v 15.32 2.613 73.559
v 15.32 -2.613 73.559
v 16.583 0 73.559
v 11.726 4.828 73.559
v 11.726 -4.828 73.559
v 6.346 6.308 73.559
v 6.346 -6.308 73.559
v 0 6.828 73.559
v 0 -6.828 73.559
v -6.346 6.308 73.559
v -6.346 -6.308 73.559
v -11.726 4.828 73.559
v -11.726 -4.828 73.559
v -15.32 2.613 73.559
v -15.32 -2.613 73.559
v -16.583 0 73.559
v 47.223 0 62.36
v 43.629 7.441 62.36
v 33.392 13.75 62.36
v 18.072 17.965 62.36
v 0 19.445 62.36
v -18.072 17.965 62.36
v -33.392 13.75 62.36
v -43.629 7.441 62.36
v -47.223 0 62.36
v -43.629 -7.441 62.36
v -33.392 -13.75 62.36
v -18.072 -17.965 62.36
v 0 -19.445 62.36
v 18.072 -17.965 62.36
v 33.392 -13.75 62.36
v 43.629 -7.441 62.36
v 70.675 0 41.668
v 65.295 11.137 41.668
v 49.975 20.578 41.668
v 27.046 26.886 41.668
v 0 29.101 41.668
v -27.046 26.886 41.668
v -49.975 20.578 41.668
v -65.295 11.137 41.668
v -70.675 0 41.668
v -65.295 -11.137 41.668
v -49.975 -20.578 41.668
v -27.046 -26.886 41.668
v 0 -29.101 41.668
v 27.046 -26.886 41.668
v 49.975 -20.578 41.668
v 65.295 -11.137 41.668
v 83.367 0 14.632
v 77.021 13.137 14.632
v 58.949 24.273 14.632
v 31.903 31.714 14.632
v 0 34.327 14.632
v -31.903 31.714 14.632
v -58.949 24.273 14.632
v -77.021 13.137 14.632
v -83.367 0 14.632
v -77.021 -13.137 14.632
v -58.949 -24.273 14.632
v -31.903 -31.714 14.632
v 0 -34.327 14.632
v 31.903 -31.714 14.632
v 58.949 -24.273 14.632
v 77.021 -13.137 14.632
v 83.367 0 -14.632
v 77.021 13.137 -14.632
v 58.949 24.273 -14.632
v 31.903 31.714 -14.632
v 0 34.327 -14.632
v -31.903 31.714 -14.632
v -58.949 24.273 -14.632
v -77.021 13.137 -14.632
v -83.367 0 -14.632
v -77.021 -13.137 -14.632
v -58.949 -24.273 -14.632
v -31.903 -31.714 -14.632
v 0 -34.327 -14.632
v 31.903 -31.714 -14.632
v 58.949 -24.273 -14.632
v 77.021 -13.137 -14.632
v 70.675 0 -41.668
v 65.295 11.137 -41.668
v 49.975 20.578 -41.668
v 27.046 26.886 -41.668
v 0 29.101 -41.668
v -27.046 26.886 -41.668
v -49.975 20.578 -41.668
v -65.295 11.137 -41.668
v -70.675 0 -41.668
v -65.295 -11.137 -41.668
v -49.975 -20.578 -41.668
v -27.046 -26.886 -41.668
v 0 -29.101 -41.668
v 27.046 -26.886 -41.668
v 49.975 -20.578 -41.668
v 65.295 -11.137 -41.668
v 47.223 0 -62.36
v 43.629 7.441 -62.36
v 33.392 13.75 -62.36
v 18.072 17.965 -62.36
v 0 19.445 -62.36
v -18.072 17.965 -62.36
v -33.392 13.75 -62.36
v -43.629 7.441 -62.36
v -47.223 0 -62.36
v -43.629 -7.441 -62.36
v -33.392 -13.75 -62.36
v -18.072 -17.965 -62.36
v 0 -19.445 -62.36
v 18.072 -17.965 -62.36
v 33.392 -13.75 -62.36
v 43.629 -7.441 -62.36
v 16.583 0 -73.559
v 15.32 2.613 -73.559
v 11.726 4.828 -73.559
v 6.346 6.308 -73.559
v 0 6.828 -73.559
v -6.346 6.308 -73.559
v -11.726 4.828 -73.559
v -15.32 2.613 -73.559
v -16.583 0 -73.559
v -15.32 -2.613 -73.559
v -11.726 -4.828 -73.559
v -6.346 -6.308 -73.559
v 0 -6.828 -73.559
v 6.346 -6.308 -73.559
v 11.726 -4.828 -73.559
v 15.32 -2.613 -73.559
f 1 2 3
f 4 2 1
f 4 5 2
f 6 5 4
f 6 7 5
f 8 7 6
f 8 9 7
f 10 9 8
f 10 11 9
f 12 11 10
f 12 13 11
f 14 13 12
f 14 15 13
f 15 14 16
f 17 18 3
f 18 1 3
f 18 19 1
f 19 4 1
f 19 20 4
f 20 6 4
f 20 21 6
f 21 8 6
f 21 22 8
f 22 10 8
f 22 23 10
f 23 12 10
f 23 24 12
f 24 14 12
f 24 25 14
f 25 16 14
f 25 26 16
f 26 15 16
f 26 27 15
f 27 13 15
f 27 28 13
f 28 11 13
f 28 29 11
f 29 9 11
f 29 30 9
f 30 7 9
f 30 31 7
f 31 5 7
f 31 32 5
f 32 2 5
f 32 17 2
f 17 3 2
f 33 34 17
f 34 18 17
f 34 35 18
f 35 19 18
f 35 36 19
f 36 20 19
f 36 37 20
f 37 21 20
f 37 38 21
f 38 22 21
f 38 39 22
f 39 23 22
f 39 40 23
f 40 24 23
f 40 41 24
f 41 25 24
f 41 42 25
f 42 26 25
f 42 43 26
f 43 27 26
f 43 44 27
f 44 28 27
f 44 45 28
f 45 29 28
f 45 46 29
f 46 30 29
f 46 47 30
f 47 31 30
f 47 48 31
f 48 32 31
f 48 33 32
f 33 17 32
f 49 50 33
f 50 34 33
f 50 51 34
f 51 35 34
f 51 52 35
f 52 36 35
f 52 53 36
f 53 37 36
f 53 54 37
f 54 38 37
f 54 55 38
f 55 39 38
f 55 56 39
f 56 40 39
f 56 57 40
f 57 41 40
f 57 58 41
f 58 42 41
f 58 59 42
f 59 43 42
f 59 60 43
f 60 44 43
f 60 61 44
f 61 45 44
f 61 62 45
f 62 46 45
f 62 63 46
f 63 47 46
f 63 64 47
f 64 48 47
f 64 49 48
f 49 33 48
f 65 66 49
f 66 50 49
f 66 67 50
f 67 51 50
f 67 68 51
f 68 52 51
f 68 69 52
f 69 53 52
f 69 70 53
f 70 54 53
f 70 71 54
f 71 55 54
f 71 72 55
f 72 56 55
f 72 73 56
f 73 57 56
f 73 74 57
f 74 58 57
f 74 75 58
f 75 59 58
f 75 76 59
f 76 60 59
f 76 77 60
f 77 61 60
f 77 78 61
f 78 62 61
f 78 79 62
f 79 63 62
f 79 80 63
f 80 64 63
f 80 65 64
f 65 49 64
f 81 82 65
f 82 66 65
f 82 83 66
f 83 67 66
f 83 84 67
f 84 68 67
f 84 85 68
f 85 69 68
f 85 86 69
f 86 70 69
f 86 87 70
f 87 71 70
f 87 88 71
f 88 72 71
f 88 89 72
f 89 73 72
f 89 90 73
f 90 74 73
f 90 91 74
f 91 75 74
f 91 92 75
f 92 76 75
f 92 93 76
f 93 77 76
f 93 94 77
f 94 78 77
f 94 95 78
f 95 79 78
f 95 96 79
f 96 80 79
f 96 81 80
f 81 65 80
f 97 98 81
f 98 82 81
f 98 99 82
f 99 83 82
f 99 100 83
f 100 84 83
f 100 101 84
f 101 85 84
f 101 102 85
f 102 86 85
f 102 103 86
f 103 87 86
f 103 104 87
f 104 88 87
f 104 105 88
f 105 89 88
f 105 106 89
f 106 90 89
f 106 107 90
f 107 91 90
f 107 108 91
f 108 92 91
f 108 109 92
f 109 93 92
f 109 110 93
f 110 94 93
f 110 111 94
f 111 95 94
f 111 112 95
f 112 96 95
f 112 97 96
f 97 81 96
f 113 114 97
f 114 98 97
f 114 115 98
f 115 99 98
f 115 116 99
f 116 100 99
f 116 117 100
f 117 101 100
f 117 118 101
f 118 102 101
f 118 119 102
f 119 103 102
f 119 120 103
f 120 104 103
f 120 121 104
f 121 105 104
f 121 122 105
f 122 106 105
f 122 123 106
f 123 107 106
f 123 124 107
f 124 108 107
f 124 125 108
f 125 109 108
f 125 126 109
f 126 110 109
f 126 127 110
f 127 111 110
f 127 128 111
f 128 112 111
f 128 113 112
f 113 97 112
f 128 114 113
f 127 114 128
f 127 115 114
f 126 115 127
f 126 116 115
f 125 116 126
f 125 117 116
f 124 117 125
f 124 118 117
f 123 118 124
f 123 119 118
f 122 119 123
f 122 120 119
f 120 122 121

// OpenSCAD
// Generated by SolidPython 1.0.1 on 2020-07-29 00:46:52


scale(v = [17, 7, 15]) {
	sphere(r = 5);
}
/***********************************************
*********      SolidPython code:      **********
************************************************
 
# import packages: SolidPython
from solid import *
from solid.utils import *
from itertools import chain, combinations, permutations


class Resize:

    def __init__(self, scad_file):
        self.scad_file = scad_file
        #self.scad_file = import_scad(scad_file)
        # cone/cylinder param:
        self.r1 = 0
        self.r2 = 0
        self.h = 0
        # rectangular prism param:
        self.w = 0
        self.l = 0
        # ellipse param:
        self.r = 0

    # import OpenScad code (file name corresponds to shape)


    # classify shape + parameters
    def assign(self, param1, param2, param3):
        if self.scad_file == 'cone.scad':
            self.r1 = param1
            self.r2 = param2
            self.h = param3
        elif self.scad_file == 'cylinder.scad':
            self.r1 = param1
            self.r2 = param2
            self.h = param3
        elif self.scad_file == 'rectangularPrism.scad':
            self.h = param1
            self.l = param2
            self.w = param3
        else:
            self.r = param1
            self.h = param2

    # resize parameters
    def iterate(self):
        x = range(3, 20, 2)
        i = 1
        if self.scad_file == 'cone.scad':
            tempList = list(permutations(x, 2))
            for temp in tempList:
                param1 = temp[0]
                param2 = temp[1]
                filepath = 'produced_scad_files/' + 'cone' + str(param1) + '_' + str(param2) + '_' + '.scad'
                scad_render_to_file(cylinder(h=param1, r1=param2, r2=0), filepath)

        elif self.scad_file == 'cylinder.scad':
            tempList = list(permutations(x, 3))
            for temp in tempList:
                param1 = temp[0]
                param2 = temp[1]
                filepath = 'produced_scad_files/' + 'cylinder' + str(param1) + '_' + str(param2) + '_' + '.scad'
                scad_render_to_file(cylinder(h=param1, r1=param2, r2=param2), filepath)

        elif self.scad_file == 'rectangularPrism.scad':
            tempList = list(permutations(x, 3))
            for temp in tempList:
                param1 = temp[0]
                param2 = temp[1]
                param3 = temp[2]
                filepath = 'produced_scad_files/' + 'rectangularPrism' + str(param1) + '_' + str(param2) + '_' + str(
                    param3) + '.scad'
                scad_render_to_file(cube(size=(param1, param2, param3)), filepath)

        elif self.scad_file == 'ellipse.scad':
            tempList = list(permutations(x, 4))
            for temp in tempList:
                param1 = temp[0]
                param2 = temp[1]
                param3 = temp[2]
                param4 = temp[3]
                filepath = 'produced_scad_files/' + 'ellipse' + str(param1) + '_' + str(param2) + '_' + str(param3) + '_' + str(param4) + '.scad'
                scad_render_to_file(scale([param1, param2, param3])(sphere(r=param4)), filepath)

    def render_to_scadfile(self):
        scad_render_to_file(scad, 'example.scad') 
 
************************************************/
